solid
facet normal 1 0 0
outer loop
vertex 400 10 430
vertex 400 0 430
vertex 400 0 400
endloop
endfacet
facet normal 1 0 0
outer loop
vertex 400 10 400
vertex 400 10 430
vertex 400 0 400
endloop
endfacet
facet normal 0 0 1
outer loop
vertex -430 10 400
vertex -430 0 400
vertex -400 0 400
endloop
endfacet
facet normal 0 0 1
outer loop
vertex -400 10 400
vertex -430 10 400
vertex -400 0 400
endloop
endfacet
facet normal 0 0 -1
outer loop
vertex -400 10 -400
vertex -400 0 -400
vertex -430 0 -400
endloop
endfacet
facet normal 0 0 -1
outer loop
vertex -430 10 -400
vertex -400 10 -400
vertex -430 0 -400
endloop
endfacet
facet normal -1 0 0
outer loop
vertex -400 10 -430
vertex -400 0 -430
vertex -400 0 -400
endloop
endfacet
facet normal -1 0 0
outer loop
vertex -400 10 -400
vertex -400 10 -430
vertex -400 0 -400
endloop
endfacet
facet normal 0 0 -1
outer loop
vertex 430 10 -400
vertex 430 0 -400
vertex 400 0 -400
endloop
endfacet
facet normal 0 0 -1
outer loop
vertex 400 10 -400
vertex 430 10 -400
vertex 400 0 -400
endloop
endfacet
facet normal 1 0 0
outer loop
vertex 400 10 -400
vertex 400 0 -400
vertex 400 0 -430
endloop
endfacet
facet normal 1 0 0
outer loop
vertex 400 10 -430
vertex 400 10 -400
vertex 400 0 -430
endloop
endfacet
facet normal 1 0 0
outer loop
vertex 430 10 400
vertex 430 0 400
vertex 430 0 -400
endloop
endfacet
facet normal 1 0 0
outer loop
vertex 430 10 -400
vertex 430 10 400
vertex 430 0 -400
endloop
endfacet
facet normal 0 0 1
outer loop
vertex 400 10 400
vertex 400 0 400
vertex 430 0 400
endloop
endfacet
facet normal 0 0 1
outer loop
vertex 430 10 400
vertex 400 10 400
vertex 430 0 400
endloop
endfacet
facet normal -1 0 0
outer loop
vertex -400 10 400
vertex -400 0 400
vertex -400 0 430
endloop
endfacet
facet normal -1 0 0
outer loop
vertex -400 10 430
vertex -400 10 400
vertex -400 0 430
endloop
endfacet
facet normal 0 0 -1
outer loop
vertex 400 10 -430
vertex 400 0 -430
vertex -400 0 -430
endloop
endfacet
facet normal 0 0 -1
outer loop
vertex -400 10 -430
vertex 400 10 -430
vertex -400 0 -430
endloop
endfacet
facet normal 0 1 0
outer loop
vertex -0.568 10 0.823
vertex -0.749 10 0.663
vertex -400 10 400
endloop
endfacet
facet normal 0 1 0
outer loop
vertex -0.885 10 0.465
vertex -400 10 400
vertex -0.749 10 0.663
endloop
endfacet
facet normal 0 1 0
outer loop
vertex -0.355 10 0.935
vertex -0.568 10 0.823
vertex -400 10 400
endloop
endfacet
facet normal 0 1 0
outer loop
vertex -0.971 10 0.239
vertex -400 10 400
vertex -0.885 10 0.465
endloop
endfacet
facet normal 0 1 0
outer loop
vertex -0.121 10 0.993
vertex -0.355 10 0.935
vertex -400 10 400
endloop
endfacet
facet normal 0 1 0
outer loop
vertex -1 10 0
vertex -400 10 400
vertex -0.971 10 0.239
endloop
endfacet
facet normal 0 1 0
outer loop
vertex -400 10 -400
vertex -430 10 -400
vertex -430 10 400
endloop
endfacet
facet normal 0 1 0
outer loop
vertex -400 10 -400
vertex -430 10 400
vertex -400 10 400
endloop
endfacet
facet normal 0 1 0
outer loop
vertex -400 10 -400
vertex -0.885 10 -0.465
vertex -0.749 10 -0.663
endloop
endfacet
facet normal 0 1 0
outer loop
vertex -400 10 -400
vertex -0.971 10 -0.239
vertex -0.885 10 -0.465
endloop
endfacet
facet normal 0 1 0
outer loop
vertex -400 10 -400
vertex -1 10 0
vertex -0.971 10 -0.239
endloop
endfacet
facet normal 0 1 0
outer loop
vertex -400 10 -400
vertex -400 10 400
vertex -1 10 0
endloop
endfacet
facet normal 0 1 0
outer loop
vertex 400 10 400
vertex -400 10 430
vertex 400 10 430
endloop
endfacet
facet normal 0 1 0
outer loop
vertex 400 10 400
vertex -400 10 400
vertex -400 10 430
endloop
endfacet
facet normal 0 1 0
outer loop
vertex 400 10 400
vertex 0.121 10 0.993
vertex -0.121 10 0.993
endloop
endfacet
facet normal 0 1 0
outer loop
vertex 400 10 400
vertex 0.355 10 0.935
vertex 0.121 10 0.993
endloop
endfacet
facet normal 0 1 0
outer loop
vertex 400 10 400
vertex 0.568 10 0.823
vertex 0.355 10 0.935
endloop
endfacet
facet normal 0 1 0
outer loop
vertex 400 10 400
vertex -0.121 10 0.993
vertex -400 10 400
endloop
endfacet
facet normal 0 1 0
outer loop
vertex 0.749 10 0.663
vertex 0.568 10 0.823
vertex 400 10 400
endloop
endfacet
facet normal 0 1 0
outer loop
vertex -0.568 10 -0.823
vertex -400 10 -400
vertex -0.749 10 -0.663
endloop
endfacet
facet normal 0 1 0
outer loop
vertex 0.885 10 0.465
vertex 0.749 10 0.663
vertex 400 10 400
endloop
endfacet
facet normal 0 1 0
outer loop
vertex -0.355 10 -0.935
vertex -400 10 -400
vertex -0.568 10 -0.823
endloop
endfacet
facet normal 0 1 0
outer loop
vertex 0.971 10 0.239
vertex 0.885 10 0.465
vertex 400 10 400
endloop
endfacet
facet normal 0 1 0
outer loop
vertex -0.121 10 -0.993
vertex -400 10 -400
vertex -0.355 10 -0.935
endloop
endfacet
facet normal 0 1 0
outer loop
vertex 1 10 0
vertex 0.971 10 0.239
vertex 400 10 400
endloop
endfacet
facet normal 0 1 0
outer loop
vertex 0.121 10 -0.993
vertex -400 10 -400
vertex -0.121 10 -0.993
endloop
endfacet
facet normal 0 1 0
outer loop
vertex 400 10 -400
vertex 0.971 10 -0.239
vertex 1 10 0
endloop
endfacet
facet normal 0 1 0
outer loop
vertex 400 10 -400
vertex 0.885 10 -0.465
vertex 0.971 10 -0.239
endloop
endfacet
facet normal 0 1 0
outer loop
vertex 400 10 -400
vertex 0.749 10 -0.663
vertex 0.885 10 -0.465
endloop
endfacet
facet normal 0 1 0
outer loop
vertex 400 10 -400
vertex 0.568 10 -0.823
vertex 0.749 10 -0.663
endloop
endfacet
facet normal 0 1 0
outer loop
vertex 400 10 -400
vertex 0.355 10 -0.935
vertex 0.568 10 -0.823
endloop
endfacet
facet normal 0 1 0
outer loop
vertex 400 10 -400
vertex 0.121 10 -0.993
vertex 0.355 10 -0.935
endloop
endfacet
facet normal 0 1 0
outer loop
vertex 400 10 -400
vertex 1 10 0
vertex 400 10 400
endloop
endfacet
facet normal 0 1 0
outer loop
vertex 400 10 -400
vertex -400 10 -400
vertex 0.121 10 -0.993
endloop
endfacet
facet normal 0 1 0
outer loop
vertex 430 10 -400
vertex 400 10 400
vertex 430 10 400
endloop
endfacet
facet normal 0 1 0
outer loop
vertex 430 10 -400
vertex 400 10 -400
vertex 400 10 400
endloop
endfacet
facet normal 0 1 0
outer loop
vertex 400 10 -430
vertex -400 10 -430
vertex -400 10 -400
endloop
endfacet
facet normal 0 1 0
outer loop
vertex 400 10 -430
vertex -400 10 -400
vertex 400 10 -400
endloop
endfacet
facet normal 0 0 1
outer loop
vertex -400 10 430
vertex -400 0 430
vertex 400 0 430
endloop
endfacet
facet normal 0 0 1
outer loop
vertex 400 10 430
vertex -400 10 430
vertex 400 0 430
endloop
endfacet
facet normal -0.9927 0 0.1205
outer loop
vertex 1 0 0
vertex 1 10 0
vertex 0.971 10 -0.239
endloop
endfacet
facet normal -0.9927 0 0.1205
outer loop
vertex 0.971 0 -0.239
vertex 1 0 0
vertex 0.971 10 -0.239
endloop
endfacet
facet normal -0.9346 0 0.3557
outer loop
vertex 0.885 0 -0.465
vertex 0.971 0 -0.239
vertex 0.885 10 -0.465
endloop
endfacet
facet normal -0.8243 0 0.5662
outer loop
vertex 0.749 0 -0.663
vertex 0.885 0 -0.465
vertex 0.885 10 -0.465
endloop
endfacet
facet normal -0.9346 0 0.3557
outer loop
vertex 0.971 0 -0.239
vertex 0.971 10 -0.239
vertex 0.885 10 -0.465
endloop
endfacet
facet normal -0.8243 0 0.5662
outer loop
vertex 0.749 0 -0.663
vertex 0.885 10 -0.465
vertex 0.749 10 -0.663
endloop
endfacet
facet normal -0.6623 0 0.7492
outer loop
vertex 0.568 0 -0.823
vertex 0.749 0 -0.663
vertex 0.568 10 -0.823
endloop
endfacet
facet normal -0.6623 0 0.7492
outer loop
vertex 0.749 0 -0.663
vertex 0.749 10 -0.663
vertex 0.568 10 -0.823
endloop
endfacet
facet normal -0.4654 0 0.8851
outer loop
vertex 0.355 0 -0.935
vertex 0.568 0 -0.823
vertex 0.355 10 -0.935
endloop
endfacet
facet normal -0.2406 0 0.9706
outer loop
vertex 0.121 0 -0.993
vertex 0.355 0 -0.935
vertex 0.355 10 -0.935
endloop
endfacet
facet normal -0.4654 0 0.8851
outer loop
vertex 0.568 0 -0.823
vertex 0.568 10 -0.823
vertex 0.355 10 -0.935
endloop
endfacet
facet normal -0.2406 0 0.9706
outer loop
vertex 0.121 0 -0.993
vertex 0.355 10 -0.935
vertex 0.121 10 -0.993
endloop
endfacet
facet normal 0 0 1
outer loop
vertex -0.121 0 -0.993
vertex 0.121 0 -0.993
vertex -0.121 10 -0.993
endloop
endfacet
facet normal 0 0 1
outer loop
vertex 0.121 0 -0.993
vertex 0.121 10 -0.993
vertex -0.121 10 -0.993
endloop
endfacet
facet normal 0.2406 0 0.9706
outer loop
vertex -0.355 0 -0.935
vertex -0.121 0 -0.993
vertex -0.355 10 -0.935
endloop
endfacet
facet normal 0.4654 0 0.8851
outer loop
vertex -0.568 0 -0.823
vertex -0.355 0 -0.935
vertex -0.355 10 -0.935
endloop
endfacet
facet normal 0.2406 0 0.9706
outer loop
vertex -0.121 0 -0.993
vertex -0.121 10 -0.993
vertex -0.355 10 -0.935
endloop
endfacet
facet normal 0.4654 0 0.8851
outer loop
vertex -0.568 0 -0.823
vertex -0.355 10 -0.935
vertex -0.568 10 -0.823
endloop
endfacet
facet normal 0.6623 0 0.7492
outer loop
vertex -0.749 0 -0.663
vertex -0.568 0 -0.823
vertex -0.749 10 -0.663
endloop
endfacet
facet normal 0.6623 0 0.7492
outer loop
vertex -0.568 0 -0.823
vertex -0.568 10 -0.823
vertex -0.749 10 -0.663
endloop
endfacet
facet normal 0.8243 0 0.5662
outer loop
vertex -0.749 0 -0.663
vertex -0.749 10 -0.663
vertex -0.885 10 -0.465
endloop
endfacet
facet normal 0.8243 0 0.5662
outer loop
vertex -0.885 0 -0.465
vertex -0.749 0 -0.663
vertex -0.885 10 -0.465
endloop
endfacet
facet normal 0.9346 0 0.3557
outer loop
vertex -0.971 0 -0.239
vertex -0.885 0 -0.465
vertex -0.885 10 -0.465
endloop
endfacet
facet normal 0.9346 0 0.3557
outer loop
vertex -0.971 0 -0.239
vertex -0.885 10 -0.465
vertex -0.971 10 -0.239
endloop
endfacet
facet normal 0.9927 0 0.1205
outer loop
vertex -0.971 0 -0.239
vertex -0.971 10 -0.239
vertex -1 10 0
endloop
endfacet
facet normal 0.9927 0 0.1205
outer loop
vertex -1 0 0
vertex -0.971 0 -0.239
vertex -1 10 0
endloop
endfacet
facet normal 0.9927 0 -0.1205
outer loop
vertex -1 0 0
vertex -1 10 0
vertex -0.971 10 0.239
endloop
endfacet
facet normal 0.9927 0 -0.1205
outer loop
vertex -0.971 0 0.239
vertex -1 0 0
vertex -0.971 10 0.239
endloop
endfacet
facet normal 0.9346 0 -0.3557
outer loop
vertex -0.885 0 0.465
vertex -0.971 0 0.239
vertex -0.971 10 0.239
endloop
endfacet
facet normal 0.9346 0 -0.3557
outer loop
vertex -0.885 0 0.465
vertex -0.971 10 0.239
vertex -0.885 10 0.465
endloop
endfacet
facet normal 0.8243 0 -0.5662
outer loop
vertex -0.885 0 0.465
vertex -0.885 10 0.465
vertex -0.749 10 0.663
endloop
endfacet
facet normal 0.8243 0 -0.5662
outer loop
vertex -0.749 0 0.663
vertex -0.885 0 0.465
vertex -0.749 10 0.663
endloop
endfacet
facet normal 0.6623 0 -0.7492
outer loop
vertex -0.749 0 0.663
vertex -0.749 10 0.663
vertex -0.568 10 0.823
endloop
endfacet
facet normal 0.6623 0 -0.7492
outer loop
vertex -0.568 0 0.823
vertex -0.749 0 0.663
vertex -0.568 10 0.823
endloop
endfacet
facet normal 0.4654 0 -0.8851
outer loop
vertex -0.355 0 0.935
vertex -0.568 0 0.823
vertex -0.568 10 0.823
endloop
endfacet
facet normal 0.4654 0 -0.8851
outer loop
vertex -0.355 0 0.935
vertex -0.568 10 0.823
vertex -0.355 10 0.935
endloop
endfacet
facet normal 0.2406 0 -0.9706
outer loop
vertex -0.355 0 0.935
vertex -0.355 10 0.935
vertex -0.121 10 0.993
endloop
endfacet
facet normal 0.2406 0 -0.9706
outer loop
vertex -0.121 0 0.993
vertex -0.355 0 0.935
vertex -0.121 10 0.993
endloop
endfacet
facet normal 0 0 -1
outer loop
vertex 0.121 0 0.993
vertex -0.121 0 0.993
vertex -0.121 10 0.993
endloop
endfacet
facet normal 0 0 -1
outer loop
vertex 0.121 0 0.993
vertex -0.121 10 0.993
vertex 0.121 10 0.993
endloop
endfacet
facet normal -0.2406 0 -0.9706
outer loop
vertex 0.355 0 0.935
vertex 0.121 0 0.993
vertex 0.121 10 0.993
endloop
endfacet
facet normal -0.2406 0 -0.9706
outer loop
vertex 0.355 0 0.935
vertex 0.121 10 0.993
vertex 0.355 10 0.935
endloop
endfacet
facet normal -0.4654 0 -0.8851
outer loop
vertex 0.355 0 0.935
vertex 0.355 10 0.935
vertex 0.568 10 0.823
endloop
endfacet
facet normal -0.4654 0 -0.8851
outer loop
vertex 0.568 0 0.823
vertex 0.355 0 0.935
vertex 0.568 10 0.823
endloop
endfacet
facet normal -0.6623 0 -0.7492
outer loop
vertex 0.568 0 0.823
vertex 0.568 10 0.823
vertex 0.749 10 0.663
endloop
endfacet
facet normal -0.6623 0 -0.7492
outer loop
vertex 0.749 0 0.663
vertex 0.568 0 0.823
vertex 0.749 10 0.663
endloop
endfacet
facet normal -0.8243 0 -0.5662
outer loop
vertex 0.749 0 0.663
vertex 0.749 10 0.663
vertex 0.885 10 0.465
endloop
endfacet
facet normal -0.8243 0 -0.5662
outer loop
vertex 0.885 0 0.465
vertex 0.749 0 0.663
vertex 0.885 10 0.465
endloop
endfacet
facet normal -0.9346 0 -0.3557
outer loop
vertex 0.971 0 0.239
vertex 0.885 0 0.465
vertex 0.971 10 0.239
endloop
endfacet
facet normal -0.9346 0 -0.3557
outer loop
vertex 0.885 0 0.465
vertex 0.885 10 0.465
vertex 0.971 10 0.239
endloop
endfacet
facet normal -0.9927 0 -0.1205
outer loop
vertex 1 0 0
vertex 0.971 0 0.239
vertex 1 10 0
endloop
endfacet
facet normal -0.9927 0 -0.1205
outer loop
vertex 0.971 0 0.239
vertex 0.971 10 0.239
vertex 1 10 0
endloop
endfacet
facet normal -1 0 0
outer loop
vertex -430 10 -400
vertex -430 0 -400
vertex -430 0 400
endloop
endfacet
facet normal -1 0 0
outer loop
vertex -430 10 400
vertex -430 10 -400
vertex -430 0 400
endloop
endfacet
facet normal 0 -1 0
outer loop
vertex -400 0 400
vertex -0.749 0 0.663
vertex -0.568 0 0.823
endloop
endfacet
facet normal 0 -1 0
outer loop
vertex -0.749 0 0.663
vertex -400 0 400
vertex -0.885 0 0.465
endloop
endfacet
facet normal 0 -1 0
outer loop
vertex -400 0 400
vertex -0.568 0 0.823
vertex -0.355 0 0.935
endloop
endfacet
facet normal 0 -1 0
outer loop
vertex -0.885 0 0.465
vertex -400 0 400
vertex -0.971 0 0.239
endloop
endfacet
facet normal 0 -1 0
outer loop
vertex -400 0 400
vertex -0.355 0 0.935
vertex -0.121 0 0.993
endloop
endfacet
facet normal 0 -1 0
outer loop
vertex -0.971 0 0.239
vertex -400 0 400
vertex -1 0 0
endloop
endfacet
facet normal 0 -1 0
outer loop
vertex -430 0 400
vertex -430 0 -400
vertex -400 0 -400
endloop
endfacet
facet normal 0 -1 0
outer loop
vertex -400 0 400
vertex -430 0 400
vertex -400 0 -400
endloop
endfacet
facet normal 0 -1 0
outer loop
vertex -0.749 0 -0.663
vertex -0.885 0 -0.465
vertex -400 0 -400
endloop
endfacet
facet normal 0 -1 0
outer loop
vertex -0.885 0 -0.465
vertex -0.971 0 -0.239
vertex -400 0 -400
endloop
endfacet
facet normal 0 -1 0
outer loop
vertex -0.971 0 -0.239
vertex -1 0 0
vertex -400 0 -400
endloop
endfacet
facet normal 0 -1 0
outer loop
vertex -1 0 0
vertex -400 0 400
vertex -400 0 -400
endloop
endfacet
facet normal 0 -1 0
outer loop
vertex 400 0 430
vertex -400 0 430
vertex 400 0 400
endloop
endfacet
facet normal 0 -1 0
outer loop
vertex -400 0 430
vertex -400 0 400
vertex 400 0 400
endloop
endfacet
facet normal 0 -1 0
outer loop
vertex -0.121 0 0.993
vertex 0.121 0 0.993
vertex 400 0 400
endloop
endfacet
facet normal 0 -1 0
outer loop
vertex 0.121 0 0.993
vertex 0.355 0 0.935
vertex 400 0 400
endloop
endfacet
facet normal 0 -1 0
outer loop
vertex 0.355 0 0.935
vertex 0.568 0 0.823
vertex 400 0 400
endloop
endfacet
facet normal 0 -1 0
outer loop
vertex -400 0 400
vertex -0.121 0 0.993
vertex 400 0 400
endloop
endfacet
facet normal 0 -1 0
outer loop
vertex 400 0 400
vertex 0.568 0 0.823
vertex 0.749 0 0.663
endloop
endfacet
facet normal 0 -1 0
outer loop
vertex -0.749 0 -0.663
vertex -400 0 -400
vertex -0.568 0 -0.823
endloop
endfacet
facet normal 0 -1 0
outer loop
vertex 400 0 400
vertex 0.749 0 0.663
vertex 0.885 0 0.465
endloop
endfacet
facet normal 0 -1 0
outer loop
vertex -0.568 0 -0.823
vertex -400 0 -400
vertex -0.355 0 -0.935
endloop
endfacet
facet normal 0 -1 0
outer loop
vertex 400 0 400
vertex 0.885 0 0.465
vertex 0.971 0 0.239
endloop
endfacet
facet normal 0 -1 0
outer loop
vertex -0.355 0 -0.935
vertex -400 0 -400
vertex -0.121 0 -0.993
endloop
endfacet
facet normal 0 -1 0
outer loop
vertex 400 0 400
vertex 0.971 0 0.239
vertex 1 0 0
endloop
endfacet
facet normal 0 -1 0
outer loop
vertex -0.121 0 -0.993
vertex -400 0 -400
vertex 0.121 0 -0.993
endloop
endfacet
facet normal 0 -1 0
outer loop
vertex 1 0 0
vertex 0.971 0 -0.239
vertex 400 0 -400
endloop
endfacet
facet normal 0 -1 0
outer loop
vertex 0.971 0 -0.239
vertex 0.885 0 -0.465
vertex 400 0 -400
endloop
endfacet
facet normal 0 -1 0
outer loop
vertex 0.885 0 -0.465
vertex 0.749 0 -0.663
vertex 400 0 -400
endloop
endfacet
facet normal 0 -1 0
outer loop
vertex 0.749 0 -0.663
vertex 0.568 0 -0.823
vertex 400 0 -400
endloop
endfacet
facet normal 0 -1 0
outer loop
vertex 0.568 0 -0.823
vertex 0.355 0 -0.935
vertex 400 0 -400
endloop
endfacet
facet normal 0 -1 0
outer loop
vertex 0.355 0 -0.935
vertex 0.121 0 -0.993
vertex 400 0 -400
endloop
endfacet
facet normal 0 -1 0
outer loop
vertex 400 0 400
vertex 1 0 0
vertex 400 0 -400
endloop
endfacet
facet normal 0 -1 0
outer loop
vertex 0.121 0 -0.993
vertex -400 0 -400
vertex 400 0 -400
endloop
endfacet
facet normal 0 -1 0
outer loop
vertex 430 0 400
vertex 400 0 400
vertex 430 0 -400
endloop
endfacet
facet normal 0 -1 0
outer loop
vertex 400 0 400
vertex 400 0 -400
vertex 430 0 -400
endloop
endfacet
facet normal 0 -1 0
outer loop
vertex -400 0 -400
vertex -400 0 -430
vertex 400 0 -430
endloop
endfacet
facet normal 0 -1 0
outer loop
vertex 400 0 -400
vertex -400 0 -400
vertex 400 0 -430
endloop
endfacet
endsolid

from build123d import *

# Parameters (mm, degrees)
BOSS_EXTRUDE1_DEPTH     = 10
SKETCH2_R               = 1
CUT_EXTRUDE1_DEPTH      = 1
CUT_EXTRUDE1_DEPTH_BACK = 11


with BuildPart() as part:
    # Sketch1 → Boss-Extrude1 (new body)
    with BuildSketch(Plane(origin=(0, 0, 0), x_dir=(1, 0, 0), z_dir=(0, 1, 0))):
        Polygon((-400, -430), (400, -430), (400, -400), (430, -400), (430, 400), (400, 400), (400, 430), (-400, 430), (-400, 400), (-430, 400), (-430, -400), (-400, -400), align=None)
    extrude(amount=BOSS_EXTRUDE1_DEPTH)

    # Sketch2 → Cut-Extrude1 (cut, two sides)
    with BuildSketch(Plane(origin=(0, 10, 0), x_dir=(1, 0, 0), z_dir=(0, 1, 0))) as cut_extrude1_sk:
        Circle(SKETCH2_R)
    extrude(amount=CUT_EXTRUDE1_DEPTH, mode=Mode.SUBTRACT)
    extrude(cut_extrude1_sk.sketch, amount=-CUT_EXTRUDE1_DEPTH_BACK, mode=Mode.SUBTRACT)


solid = part.part
